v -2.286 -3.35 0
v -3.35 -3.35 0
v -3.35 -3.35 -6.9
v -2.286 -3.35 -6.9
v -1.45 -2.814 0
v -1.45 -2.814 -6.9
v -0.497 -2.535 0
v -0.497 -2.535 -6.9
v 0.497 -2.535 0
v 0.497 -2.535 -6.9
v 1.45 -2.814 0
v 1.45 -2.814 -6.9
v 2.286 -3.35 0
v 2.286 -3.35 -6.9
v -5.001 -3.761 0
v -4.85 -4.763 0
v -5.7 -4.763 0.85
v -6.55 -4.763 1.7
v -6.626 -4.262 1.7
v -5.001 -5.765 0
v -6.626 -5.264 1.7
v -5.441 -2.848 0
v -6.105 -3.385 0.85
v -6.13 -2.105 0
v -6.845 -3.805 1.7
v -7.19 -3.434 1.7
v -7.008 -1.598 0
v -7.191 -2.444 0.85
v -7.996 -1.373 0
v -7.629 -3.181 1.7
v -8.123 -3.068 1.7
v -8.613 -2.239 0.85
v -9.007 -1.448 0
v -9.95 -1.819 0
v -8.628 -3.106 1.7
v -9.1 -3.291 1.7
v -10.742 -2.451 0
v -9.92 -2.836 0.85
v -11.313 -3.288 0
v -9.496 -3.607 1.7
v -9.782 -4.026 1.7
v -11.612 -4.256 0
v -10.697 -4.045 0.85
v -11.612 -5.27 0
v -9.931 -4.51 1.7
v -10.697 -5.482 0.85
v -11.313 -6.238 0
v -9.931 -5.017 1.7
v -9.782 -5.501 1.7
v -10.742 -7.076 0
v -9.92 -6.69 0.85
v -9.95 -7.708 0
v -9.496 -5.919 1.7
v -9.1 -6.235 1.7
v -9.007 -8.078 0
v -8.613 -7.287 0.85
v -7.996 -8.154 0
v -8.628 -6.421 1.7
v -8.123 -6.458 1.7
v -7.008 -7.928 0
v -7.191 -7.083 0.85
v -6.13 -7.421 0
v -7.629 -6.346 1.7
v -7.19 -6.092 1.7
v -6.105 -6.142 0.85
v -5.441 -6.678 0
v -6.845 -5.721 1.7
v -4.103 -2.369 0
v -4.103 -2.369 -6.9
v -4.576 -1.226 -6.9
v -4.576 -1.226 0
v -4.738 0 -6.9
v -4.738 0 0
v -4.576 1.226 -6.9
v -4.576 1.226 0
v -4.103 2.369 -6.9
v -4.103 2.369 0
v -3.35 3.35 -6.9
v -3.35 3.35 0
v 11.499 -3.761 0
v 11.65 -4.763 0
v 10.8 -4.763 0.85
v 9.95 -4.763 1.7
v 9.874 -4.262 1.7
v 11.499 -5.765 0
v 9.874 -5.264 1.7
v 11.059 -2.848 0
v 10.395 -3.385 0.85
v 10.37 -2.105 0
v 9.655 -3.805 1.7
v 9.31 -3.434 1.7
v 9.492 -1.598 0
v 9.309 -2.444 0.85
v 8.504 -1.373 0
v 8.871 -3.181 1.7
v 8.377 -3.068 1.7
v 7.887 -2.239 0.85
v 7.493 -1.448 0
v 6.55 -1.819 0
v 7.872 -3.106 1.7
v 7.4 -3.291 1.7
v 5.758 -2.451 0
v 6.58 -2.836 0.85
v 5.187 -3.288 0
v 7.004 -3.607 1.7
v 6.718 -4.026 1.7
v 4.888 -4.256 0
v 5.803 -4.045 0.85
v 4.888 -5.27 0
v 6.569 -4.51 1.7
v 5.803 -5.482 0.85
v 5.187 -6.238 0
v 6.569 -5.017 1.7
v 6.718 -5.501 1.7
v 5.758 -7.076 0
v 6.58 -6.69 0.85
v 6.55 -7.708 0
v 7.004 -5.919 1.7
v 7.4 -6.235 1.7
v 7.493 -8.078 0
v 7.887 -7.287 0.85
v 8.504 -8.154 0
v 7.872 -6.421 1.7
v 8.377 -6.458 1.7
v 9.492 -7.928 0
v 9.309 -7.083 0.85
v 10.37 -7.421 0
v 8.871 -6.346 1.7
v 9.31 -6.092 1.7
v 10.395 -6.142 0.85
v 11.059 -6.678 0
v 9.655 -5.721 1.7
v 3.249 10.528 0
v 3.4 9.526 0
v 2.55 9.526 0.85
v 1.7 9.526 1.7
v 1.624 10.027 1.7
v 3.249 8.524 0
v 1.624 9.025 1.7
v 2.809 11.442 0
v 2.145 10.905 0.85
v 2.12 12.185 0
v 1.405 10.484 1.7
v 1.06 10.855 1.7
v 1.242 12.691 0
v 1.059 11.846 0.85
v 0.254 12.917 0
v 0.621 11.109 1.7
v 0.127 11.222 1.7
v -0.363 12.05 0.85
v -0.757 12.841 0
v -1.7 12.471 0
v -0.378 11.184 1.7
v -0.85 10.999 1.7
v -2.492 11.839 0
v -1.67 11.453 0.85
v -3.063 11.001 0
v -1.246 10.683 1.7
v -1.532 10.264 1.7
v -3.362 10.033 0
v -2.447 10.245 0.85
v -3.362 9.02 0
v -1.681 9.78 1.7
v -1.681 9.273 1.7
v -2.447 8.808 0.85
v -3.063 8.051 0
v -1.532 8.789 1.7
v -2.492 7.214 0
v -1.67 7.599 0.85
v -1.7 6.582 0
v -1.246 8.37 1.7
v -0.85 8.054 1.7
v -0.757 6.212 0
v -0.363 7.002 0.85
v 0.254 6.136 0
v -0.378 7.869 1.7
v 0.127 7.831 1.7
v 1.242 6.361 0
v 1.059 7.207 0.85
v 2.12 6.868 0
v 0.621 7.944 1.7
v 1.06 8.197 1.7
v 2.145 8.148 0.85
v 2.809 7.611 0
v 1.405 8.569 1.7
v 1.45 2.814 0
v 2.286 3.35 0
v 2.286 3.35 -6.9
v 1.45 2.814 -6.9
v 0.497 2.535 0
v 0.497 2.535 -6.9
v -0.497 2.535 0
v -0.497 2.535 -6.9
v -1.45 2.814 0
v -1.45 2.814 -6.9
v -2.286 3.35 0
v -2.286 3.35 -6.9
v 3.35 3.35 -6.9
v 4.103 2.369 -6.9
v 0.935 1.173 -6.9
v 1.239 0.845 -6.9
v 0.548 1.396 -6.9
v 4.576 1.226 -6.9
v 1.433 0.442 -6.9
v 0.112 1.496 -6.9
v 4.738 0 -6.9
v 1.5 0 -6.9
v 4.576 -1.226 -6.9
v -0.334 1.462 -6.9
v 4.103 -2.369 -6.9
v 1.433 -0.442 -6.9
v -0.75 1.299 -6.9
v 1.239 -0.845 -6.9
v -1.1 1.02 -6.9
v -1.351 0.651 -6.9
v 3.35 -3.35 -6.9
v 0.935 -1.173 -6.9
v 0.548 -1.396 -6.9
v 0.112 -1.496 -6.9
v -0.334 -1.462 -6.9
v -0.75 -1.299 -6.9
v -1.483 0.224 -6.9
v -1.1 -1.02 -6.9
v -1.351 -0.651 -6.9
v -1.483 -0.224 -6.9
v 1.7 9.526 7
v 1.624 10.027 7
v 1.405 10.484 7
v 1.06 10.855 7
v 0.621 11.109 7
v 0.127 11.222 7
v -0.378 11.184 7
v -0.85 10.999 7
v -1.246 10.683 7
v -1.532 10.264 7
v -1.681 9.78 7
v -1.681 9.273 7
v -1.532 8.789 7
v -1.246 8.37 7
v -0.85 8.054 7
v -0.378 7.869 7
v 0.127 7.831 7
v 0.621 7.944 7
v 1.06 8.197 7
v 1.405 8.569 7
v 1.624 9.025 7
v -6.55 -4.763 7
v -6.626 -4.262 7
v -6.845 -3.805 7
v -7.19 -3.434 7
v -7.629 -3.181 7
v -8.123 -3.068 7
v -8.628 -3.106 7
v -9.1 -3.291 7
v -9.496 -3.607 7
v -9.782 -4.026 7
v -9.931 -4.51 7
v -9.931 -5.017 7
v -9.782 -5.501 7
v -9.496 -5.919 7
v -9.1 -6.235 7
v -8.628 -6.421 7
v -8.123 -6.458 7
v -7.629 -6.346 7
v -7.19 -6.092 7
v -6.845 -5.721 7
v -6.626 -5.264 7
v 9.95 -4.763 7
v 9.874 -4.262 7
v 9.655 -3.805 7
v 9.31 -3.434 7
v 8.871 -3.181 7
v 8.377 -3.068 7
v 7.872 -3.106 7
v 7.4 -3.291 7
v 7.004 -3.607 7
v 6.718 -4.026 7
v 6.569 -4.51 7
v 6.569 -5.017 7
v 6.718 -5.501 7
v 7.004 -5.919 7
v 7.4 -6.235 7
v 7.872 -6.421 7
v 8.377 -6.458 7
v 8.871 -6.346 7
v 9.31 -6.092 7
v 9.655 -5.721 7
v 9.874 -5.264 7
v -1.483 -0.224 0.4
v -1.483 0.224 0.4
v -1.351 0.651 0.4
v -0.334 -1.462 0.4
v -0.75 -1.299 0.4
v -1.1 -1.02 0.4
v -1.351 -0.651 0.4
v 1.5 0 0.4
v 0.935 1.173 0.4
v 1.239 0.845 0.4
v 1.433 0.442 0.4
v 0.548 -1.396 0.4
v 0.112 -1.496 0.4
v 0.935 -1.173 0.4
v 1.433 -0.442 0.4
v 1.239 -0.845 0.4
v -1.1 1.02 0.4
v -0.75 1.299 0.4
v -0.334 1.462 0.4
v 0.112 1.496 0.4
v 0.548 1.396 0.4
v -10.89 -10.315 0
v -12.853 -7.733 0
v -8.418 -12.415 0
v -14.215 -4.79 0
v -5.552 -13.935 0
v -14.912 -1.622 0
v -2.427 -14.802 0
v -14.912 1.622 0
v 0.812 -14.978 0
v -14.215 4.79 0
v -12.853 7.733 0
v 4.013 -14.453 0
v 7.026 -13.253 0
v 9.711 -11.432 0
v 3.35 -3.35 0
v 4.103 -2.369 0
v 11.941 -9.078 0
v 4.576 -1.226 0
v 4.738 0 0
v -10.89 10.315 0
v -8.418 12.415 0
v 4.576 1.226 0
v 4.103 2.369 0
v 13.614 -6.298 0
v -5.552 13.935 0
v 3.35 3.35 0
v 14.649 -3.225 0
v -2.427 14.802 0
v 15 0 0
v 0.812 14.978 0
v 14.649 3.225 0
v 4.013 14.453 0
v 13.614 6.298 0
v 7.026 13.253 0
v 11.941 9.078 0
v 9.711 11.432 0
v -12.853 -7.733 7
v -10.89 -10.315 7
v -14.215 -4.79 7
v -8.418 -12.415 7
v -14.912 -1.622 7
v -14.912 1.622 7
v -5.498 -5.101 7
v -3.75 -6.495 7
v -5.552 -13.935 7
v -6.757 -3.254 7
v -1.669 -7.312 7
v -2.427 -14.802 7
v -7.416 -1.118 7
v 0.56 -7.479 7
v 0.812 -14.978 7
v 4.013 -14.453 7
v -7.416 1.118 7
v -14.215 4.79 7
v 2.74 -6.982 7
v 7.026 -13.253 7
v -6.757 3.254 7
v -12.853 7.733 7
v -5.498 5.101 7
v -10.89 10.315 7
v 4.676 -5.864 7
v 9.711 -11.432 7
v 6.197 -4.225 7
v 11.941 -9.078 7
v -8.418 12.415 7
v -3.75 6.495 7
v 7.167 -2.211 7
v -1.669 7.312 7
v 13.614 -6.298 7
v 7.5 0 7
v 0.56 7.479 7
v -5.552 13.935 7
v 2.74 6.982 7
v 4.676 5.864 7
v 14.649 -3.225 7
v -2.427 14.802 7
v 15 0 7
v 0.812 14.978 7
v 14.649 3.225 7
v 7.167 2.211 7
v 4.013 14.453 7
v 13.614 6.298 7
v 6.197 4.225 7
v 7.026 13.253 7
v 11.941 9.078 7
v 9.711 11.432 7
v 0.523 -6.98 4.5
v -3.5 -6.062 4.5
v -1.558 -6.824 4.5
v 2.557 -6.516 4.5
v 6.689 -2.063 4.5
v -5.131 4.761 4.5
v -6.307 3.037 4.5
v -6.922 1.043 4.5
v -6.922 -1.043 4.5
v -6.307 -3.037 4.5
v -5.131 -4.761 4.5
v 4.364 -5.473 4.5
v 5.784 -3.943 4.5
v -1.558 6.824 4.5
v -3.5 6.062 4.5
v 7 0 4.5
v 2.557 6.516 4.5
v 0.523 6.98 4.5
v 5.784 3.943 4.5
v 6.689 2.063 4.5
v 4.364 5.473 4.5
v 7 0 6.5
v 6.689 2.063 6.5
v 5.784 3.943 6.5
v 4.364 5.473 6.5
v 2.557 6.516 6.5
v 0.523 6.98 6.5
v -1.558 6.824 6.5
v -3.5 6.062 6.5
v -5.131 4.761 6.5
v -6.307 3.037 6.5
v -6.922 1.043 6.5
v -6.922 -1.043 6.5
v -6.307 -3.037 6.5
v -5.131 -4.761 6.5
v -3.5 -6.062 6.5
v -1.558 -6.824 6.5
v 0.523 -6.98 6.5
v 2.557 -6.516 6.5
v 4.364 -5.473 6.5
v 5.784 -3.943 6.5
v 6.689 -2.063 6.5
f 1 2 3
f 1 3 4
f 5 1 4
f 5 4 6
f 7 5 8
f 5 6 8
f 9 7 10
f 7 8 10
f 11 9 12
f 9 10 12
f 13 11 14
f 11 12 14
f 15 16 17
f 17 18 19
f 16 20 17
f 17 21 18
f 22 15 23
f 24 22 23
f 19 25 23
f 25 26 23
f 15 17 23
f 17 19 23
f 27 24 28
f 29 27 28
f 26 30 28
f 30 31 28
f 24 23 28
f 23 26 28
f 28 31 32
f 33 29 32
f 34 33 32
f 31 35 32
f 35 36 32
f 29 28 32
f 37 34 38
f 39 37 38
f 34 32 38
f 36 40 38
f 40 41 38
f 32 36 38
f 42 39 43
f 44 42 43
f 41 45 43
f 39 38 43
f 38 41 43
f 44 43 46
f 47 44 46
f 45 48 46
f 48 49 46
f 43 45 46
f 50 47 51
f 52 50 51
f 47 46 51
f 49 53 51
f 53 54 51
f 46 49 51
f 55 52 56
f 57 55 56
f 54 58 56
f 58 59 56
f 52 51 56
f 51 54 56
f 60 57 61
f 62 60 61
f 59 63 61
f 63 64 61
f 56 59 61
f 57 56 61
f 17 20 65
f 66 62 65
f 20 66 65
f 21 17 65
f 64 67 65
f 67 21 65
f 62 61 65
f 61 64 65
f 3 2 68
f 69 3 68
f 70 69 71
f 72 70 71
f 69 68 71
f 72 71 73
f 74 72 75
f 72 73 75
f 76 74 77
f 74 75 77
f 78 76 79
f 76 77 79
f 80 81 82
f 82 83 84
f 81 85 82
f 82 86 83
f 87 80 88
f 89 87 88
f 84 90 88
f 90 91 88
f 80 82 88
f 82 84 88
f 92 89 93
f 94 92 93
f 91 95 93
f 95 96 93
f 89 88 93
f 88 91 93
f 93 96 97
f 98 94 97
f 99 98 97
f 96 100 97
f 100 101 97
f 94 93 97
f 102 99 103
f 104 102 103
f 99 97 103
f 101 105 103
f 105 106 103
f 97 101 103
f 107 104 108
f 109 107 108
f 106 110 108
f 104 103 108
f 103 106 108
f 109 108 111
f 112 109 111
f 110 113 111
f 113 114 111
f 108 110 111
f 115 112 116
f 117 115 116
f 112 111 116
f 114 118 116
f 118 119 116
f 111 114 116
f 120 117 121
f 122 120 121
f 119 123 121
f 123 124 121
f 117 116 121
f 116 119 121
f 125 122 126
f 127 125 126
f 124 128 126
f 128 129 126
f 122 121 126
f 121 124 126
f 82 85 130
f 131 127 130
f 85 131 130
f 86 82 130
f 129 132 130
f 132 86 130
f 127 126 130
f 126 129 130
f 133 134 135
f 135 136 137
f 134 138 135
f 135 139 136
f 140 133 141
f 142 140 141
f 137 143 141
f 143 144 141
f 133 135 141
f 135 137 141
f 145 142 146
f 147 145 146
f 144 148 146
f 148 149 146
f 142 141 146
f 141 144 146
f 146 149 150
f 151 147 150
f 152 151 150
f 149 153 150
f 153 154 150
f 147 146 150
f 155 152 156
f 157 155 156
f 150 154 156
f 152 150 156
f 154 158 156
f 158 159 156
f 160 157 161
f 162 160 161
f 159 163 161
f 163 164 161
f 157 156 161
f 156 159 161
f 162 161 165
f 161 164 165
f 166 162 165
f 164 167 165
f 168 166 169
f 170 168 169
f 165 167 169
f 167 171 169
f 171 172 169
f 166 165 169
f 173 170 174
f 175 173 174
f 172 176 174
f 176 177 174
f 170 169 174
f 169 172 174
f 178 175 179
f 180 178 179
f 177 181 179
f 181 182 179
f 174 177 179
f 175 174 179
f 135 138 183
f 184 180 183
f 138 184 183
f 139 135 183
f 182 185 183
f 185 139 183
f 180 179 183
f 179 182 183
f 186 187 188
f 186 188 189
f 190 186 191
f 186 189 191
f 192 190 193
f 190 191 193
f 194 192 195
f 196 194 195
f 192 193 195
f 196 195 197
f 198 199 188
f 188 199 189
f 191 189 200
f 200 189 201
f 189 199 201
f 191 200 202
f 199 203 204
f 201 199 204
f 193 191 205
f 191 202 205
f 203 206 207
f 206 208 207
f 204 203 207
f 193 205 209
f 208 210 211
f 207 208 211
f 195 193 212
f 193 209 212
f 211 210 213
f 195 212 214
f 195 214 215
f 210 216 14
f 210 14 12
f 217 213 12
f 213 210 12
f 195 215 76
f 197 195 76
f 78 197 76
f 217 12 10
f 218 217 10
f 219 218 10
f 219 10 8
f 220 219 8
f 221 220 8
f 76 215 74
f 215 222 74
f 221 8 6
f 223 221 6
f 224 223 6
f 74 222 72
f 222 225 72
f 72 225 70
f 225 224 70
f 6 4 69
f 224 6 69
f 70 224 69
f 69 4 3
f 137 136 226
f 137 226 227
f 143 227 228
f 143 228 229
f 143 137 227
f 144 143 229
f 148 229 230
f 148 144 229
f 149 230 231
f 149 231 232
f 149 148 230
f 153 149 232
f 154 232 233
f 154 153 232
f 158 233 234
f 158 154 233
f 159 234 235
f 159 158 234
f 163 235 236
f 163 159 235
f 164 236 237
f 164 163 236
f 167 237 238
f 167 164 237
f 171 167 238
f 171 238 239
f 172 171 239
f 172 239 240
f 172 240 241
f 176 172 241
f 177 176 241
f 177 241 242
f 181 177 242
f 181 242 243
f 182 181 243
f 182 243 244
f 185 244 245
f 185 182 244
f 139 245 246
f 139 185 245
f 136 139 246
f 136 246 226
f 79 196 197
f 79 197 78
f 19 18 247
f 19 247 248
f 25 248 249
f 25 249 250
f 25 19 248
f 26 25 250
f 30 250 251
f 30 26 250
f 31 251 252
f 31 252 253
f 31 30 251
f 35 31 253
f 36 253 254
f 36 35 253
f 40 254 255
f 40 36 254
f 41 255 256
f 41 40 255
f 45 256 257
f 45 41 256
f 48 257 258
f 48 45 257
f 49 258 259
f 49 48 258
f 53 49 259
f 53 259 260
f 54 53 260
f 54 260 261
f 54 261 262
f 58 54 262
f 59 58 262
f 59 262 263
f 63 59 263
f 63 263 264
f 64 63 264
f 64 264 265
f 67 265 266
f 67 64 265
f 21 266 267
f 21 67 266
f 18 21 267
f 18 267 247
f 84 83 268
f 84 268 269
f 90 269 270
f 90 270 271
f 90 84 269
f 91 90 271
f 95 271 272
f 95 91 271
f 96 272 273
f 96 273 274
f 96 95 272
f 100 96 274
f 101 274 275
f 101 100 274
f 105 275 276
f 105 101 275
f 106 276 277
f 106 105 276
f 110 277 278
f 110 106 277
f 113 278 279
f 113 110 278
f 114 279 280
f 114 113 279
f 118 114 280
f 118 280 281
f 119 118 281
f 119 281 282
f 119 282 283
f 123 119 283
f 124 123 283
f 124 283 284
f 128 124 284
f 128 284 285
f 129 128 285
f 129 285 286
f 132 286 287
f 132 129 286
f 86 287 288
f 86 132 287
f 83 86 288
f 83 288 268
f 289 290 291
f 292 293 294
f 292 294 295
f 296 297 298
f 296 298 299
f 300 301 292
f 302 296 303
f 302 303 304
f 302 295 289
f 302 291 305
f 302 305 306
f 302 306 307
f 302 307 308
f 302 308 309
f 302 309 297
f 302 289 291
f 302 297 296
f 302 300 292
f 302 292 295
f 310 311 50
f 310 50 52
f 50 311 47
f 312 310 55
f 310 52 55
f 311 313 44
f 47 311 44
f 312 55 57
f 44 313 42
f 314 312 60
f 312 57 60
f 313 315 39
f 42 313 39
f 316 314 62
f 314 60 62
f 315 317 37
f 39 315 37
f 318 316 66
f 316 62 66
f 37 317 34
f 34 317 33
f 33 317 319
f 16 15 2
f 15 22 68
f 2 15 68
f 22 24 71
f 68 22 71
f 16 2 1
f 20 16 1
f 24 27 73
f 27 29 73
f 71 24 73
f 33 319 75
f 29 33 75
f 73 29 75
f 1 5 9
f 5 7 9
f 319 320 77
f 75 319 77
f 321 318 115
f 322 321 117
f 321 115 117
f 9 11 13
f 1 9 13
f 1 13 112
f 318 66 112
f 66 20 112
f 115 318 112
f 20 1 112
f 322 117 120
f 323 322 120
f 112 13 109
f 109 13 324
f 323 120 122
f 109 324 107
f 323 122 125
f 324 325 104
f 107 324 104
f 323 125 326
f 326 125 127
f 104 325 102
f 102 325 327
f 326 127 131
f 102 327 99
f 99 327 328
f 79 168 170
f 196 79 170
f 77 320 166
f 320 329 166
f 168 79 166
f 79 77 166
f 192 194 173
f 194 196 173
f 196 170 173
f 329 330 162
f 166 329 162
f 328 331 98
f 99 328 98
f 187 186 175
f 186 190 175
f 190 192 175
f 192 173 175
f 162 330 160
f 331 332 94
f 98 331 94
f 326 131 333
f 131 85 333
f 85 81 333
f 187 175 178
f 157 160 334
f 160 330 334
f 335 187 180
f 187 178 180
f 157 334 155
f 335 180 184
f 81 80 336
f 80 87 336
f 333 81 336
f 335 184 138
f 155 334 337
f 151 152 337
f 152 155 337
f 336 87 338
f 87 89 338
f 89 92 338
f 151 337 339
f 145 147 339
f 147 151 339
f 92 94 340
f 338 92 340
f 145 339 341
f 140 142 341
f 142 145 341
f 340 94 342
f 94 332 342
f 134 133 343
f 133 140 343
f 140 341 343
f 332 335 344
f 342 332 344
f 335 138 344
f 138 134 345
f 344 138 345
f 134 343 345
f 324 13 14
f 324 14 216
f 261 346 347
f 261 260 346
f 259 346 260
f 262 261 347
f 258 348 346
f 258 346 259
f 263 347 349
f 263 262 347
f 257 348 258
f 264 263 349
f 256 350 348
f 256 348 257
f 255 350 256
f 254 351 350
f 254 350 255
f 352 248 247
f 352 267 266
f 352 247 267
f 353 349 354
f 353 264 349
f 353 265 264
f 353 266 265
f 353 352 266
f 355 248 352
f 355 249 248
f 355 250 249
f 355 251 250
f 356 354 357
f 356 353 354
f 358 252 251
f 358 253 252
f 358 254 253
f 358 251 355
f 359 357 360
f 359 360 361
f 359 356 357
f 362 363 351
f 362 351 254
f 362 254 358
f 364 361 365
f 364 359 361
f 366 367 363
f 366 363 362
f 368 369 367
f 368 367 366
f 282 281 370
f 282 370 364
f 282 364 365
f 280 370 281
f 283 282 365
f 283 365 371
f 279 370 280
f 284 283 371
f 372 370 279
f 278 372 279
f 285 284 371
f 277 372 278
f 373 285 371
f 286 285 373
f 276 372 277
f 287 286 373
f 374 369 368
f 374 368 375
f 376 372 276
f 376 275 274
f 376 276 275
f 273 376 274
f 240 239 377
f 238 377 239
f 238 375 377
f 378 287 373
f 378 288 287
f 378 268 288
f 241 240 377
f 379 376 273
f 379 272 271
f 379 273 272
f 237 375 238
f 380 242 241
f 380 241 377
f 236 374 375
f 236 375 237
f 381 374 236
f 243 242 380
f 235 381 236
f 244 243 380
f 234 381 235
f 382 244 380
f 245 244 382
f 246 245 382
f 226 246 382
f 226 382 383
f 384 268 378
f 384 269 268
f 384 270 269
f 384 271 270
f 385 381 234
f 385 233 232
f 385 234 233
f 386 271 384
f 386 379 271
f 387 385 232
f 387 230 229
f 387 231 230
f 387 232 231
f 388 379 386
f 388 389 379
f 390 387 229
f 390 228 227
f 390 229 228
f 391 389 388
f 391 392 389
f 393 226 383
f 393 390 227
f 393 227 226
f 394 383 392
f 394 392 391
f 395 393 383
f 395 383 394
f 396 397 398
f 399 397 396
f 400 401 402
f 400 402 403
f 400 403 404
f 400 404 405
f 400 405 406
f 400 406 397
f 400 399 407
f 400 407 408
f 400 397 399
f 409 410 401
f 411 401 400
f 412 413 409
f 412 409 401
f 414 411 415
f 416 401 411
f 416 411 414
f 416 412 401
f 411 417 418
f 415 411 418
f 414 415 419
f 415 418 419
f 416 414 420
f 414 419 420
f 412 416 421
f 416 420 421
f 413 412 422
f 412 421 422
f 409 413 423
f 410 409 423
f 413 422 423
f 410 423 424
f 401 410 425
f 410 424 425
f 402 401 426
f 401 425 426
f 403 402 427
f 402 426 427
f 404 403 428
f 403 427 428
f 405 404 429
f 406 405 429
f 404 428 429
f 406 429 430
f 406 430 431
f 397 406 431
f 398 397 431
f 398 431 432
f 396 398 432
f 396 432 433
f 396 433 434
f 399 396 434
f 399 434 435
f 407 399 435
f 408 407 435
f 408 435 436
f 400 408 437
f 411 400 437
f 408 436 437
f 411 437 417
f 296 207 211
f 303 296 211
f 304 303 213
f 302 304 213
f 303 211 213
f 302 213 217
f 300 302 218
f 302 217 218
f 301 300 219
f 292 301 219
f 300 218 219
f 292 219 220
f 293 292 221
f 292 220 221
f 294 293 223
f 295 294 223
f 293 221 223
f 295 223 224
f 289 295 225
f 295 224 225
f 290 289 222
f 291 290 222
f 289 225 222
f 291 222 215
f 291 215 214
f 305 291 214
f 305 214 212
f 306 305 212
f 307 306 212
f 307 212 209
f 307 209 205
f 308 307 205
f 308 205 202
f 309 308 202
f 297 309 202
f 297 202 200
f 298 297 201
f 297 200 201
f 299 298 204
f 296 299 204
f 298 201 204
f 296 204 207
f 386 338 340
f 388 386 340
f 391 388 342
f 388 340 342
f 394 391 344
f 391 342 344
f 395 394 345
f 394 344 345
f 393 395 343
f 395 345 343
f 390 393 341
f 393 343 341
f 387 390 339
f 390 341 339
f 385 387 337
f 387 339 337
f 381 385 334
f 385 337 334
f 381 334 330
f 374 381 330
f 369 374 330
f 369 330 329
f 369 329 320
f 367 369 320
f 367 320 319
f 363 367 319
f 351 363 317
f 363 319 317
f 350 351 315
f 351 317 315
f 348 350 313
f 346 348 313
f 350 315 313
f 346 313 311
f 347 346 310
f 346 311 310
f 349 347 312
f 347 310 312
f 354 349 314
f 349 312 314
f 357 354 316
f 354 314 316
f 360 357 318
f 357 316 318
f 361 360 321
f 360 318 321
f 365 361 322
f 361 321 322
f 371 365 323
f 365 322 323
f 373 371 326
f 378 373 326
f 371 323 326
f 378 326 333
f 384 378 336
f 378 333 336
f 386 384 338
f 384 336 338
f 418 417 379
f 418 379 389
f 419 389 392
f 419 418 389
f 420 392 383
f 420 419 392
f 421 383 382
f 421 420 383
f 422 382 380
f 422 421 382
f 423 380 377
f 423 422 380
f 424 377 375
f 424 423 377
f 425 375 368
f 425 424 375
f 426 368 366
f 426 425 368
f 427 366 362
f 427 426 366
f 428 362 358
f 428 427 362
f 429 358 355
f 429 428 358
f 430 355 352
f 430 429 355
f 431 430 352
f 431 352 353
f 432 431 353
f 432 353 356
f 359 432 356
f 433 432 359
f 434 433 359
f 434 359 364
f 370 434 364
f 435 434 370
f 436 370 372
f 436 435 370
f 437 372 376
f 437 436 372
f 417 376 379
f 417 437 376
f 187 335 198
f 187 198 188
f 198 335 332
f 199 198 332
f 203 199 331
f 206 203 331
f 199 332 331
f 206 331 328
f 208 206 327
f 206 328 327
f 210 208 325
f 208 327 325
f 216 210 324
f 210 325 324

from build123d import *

# Parameters (mm, degrees)
SKETCH_R        = 15
SKETCH_R_2      = 1.7
PAD_DEPTH       = 7
PAD001_DEPTH    = 6.9
SKETCH006_R     = 3.5
POCKET003_DEPTH = 6.9
SKETCH003_R     = 1.5
POCKET004_DEPTH = 7.3
SKETCH008_R     = 7
POCKET_DEPTH    = 2.5
CHAMFER_SIZE    = 1.7
CHAMFER001_SIZE = 1.7
CHAMFER002_SIZE = 1.7
CHAMFER003_SIZE = 0.5


with BuildPart() as part:
    # Sketch → Pad (new body)
    with BuildSketch(Plane.XY):
        Circle(SKETCH_R)
        with Locations((0, 9.526279)):
            Circle(SKETCH_R_2, mode=Mode.SUBTRACT)
        with Locations((-8.25, -4.76314)):
            Circle(SKETCH_R_2, mode=Mode.SUBTRACT)
        with Locations((8.25, -4.76314)):
            Circle(SKETCH_R_2, mode=Mode.SUBTRACT)
    extrude(amount=PAD_DEPTH)

    # Sketch004 → Pad001 (new body)
    with BuildSketch(Plane(origin=(0, 0, 0), x_dir=(1, 0, 0), z_dir=(0, 0, -1))):
        with BuildLine():
            Line((-3.35, 3.35), (3.35, 3.35))
            ThreePointArc((3.35, -3.35), (4.737615, 0), (3.35, 3.35))
            Line((3.35, -3.35), (-3.35, -3.35))
            ThreePointArc((-3.35, 3.35), (-4.737615, 0), (-3.35, -3.35))
        make_face()
    extrude(amount=PAD001_DEPTH)

    # Sketch006 → Pocket003 (cut)
    with BuildSketch(Plane(origin=(0, 0, -6.9), x_dir=(1, 0, 0), z_dir=(0, 0, -1))):
        with Locations((0, 6)):
            Circle(SKETCH006_R)
        with Locations((0, -6)):
            Circle(SKETCH006_R)
    extrude(amount=-POCKET003_DEPTH, mode=Mode.SUBTRACT)

    # Sketch003 → Pocket004 (cut)
    with BuildSketch(Plane(origin=(0, 0, -6.9), x_dir=(1, 0, 0), z_dir=(0, 0, -1))):
        Circle(SKETCH003_R)
    extrude(amount=-POCKET004_DEPTH, mode=Mode.SUBTRACT)

    # Sketch008 → Pocket (cut)
    with BuildSketch(Plane.XY.offset(7)):
        Circle(SKETCH008_R)
    extrude(amount=-POCKET_DEPTH, mode=Mode.SUBTRACT)

    # Chamfer
    chamfer_edges = [part.edges().sort_by_distance(p)[0] for p in [
        (-9.95, -4.76314, 0),
    ]]
    chamfer(chamfer_edges, length=CHAMFER_SIZE)

    # Chamfer001
    chamfer001_edges = [part.edges().sort_by_distance(p)[0] for p in [
        (6.55, -4.76314, 0),
    ]]
    chamfer(chamfer001_edges, length=CHAMFER001_SIZE)

    # Chamfer002
    chamfer002_edges = [part.edges().sort_by_distance(p)[0] for p in [
        (-0.219827, 11.212007, 0),
    ]]
    chamfer(chamfer002_edges, length=CHAMFER002_SIZE)

    # Chamfer003
    chamfer003_edges = [part.edges().sort_by_distance(p)[0] for p in [
        (-7, 0, 7),
    ]]
    chamfer(chamfer003_edges, length=CHAMFER003_SIZE)


solid = part.part
